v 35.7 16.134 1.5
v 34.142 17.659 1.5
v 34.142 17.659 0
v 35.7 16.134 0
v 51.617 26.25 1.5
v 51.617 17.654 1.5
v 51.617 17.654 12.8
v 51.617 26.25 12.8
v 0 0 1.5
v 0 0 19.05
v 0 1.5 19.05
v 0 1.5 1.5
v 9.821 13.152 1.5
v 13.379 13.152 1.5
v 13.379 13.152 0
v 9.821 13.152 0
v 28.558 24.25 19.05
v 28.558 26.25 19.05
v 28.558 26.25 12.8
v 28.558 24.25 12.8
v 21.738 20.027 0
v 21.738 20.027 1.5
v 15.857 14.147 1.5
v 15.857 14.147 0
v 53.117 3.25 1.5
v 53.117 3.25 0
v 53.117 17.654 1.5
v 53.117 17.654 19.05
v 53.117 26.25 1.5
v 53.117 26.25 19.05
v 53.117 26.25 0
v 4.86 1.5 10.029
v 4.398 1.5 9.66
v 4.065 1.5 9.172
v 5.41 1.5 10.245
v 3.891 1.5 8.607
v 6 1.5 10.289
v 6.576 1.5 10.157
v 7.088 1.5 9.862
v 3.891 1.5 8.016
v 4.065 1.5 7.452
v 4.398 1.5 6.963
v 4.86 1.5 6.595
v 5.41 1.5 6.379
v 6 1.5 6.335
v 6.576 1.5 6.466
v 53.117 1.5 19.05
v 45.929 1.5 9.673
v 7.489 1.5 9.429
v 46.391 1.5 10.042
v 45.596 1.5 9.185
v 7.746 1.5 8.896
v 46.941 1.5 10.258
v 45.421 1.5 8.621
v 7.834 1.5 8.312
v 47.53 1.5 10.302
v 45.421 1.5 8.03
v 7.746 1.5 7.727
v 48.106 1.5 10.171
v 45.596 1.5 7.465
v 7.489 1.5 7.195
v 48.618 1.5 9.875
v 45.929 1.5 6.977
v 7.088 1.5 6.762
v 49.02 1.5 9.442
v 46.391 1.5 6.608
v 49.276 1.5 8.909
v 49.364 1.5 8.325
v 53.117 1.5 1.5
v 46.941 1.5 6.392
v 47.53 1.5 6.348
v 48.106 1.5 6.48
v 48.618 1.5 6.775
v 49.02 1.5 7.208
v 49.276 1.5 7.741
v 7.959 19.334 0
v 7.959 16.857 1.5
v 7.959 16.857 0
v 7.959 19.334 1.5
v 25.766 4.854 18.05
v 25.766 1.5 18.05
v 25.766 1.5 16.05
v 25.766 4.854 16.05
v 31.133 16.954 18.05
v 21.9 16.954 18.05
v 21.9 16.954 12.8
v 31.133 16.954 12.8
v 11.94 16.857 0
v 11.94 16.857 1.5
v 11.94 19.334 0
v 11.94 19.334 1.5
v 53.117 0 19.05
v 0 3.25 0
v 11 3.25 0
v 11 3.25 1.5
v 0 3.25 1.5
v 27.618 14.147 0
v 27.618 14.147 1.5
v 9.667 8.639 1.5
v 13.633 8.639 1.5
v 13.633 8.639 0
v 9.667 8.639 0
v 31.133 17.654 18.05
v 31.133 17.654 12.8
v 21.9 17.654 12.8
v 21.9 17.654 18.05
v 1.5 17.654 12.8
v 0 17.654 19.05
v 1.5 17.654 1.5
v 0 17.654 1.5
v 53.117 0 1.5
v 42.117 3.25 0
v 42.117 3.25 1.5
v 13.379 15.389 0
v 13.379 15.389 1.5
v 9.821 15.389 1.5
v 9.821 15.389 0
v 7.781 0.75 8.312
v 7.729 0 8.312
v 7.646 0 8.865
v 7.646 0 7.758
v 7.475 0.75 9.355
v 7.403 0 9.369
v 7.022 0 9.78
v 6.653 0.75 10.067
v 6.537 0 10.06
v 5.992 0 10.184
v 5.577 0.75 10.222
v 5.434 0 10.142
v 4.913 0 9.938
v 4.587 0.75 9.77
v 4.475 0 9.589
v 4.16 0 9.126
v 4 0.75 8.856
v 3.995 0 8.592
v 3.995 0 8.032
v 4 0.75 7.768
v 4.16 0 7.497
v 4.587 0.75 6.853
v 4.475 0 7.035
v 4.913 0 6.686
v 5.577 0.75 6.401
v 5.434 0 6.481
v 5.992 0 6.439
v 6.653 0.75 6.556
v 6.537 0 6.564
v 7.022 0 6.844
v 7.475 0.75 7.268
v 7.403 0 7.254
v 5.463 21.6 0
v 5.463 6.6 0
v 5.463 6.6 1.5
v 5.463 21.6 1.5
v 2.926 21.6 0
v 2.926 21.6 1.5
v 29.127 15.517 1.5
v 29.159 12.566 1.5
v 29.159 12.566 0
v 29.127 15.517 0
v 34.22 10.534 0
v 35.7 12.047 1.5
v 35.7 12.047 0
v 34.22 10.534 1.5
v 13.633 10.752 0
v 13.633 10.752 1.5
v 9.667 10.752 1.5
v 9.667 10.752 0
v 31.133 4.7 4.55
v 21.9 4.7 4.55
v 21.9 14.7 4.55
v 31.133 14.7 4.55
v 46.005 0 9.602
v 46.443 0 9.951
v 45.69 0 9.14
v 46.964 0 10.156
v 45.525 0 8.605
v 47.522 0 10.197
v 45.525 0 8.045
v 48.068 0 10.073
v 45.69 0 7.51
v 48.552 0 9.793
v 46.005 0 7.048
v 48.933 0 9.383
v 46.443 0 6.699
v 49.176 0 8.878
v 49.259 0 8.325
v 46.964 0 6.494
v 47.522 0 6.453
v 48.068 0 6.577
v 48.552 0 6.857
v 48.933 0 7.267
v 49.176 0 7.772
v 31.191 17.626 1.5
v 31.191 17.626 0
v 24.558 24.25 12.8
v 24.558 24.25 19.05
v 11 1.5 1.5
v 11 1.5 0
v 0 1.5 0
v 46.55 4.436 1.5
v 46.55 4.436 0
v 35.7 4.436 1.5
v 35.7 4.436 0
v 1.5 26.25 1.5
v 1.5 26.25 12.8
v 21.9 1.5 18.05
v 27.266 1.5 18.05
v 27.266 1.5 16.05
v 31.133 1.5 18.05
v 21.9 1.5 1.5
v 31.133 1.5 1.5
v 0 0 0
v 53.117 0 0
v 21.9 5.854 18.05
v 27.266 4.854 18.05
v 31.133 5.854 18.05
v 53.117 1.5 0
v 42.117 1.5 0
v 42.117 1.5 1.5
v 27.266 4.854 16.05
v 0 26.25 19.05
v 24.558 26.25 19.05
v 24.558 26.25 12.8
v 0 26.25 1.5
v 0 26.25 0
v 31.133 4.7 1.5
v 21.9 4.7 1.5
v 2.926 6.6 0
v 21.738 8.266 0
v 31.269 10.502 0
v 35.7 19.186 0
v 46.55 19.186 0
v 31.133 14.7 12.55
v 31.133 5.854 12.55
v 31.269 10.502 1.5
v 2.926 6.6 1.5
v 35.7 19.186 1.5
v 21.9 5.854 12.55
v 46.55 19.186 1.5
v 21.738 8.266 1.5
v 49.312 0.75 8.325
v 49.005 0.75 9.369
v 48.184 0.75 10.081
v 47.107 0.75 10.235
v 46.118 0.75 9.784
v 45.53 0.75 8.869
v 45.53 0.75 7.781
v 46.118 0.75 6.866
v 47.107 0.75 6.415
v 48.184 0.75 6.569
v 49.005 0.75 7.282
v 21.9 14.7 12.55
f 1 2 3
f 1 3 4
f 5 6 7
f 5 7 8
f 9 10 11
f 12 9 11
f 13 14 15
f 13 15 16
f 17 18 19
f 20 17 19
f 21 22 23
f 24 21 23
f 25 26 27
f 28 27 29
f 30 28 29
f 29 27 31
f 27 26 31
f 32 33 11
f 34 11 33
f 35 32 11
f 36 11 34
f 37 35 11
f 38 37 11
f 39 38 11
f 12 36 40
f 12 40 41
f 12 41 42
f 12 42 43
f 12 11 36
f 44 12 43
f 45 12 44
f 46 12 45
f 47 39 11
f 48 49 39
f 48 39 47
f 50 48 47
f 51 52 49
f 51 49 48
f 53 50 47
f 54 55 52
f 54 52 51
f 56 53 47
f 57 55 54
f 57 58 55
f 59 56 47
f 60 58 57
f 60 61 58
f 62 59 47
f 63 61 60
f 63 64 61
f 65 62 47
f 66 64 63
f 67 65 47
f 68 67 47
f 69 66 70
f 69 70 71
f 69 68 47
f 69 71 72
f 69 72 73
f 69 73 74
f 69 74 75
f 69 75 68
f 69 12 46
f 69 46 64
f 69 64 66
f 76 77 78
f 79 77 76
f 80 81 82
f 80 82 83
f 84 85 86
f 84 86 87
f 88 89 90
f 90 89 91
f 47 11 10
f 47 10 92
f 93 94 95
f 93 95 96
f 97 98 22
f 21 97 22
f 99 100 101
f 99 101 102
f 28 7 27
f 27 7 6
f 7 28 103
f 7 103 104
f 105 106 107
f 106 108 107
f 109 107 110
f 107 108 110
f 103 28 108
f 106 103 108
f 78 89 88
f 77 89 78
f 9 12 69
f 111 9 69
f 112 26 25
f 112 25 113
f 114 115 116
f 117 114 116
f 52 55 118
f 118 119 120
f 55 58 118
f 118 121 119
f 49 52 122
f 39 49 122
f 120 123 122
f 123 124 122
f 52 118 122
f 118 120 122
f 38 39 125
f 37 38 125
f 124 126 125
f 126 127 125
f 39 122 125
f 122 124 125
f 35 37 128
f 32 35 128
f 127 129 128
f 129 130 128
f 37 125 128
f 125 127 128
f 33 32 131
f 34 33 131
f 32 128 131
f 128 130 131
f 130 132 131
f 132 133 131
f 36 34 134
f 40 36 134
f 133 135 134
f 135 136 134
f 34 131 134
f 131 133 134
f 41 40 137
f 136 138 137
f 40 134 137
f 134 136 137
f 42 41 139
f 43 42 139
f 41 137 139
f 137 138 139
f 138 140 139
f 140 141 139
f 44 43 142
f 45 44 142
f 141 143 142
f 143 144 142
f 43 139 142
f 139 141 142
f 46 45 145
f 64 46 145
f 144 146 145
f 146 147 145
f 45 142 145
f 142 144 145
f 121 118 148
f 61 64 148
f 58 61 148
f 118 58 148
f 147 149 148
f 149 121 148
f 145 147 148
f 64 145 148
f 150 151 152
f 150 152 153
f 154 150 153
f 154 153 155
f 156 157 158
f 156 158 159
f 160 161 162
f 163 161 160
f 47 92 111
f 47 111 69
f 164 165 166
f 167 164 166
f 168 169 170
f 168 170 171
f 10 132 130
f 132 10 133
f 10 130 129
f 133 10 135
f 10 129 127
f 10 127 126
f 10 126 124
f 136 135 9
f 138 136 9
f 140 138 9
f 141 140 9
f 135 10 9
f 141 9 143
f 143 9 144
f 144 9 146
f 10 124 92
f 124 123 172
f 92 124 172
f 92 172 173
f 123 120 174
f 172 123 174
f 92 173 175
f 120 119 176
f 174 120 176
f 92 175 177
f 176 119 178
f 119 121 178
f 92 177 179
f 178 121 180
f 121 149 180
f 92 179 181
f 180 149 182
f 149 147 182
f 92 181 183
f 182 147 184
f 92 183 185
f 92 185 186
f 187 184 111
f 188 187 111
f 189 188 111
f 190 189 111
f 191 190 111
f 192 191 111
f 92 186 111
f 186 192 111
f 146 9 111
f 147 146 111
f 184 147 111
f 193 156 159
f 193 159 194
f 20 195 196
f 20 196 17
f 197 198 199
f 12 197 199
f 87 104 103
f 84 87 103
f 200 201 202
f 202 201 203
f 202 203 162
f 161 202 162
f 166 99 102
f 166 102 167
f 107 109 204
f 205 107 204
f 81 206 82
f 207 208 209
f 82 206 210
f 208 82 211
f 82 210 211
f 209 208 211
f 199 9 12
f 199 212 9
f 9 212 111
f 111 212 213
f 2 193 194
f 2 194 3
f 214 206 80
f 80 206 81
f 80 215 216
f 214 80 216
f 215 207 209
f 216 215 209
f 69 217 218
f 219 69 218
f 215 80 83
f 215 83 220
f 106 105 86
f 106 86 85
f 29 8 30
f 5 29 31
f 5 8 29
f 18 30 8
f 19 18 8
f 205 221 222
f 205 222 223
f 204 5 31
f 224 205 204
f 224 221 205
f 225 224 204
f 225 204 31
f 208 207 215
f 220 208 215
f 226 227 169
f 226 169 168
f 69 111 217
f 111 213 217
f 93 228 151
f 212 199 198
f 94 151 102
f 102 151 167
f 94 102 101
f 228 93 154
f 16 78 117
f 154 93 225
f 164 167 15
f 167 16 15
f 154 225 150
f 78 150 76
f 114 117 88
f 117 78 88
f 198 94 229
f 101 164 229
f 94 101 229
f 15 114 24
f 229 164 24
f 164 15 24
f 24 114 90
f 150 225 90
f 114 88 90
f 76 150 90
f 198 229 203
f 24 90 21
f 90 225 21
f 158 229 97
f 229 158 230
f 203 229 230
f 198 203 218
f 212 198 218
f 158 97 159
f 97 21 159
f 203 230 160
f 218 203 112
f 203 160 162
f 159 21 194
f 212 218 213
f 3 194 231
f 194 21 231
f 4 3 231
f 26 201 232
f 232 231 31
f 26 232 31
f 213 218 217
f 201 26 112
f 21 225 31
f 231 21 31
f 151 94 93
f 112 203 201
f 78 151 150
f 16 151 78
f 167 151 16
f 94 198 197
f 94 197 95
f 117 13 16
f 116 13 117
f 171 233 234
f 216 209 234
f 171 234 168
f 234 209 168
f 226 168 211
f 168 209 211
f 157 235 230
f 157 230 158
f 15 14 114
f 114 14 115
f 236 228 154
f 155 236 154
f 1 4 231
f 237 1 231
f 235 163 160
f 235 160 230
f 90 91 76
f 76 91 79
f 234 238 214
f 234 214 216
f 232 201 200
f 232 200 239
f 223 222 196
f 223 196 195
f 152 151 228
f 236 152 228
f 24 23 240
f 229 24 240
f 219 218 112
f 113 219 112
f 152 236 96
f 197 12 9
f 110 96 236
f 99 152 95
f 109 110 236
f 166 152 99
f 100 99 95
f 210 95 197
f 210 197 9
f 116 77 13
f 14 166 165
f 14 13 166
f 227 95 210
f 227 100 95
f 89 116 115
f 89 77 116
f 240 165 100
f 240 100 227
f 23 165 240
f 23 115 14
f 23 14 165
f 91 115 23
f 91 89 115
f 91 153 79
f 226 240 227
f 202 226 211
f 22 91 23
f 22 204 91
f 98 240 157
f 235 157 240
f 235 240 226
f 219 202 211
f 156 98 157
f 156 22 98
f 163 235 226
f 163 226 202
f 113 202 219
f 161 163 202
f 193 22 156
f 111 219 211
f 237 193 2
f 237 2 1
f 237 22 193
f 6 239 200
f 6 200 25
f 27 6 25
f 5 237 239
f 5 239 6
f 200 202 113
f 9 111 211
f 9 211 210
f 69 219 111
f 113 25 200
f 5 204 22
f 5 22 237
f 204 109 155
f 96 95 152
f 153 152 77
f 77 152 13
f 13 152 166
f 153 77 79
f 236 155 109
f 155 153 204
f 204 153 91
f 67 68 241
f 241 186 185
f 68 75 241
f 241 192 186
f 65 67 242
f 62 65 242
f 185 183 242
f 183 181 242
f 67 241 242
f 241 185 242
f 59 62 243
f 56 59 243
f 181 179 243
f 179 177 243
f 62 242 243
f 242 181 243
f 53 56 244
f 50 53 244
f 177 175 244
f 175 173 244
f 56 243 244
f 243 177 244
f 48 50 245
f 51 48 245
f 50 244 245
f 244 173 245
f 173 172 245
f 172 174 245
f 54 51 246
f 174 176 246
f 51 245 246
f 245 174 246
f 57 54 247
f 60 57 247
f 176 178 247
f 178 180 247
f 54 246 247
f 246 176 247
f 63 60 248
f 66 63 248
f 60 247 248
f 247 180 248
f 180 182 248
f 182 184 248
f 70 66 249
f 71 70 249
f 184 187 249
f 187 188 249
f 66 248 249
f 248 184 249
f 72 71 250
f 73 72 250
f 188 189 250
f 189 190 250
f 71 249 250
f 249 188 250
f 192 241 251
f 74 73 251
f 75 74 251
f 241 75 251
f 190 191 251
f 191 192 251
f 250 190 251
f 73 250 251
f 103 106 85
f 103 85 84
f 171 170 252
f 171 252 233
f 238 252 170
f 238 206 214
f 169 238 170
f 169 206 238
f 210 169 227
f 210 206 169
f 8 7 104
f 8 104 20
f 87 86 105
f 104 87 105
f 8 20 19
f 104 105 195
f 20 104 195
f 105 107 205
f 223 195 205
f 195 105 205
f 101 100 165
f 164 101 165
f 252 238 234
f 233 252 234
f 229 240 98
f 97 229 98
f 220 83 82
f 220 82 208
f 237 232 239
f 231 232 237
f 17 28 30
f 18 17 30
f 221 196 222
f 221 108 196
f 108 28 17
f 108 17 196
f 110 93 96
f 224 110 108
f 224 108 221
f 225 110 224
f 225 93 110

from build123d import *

# Parameters (mm, degrees)
SKETCH1_W                              = 53.116817528
SKETCH1_H                              = 26.25
FRONT_SIDE_MAIN_DEPTH                  = 1.5
RESET_HOLE_DEPTH                       = 3.25
SKETCH15_W                             = 3.966010581
SKETCH15_H                             = 2.112155191
SKETCH15_W_2                           = 3.557190409
SKETCH15_H_2                           = 2.236587576
SKETCH15_W_3                           = 3.981127105
SKETCH15_H_3                           = 2.476855865
COMPONENT_HOLES_DEPTH                  = 3.25
SKETCH16_W                             = 10.85
SKETCH16_H                             = 14.75
MICROPHONE_HOLE_DEPTH                  = 1.5
SKETCH24_W                             = 1.5
SKETCH24_H                             = 8.595542059
RIGHT_SIDE_TOP_DEPTH                   = 17.55
SKETCH20_W                             = 53.116817528
SKETCH20_H                             = 1.5
BOTTOM_BASE_DEPTH                      = 17.55
SKETCH26_W                             = 1.5
SKETCH26_H                             = 8.595542059
LEFT_SIDE_TOP_DEPTH                    = 17.55
SKETCH27_W                             = 6.25
SKETCH27_H                             = 8.595542059
BACK_BAR_TOP_DEPTH                     = 50.116817528
SERVO_SEPERATOR_BOTTOM_OUTLINE_W       = 9.232806166
SERVO_SEPERATOR_BOTTOM_OUTLINE_H       = 3.2
SERVO_SEPERATOR_BOTTOM_DEPTH           = 16.55
SKETCH28_W                             = 9.232806166
SKETCH28_H                             = 5.25
BACK_BATTERY_HOLDER_TOP_DEPTH          = 0.7
SKETCH34_W                             = 2.537171882
SKETCH34_H                             = 15
PROGRAMMING_HOLE_DEPTH                 = 3.25
SKETCH38_W                             = 9.232806166
SKETCH38_H                             = 5.5
BACK_BATTERY_HOLDER_BOTTOM_DEPTH       = 1.154457941
SKETCH40_R                             = 1.877628079
SERVO_ARM_HOLES_BOTTOM_DEPTH           = 1.5
SERVO_ARM_HOLES_BOTTOM_DRAFT           = 4
SERVO_ARM_HOLES_BOTTOM_PROFILE_2_DEPTH = 1.5
SERVO_ARM_HOLES_BOTTOM_PROFILE_2_DRAFT = 4
SKETCH44_W                             = 1.5
SKETCH44_H                             = 3.354457941
SNAP_HOLE_BOTTOM_DEPTH                 = 2
SKETCH46_W                             = 4
SKETCH46_H                             = 6.25
SNAP_CUT_TOP_DEPTH                     = 2
SKETCH47_W                             = 11
SKETCH47_H                             = 1.75
SOLAR_ARM_HOLES_FRONT_DEPTH            = 1.5
SKETCH49_W                             = 9.232806166
SKETCH49_H                             = 8
RAISED_SERVO_SEPERATOR_DEPTH           = 10


# Read off the part's stored shape, not the designer's step: Servo Seperator - Bottom
with BuildPart() as part:
    # Sketch1 → Front Side - Main (new body)
    with BuildSketch(Plane.XY):
        with Locations((26.558408764, 13.125)):
            Rectangle(SKETCH1_W, SKETCH1_H)
    extrude(amount=FRONT_SIDE_MAIN_DEPTH)

    # Reset Hole Sketch → Reset Hole (cut)
    with BuildSketch(Plane(origin=(0, 0, 3.25), x_dir=(-1, 0, 0), z_dir=(0, 0, -1))):
        Polygon((-31.190735744, 17.626168756), (-34.141748042, 17.658585925), (-36.251351249, 15.594827519), (-36.283768419, 12.643815222), (-34.220010013, 10.534212015), (-31.268997715, 10.501794845), (-29.159394508, 12.565553251), (-29.126977338, 15.516565548), align=None)
    extrude(amount=RESET_HOLE_DEPTH, mode=Mode.SUBTRACT)

    # Sketch15 → Component Holes (cut)
    with BuildSketch(Plane(origin=(0, 0, 3.25), x_dir=(-1, 0, 0), z_dir=(0, 0, -1))):
        Polygon((-21.737702993, 20.027277789), (-15.857179586, 14.146754382), (-21.737702993, 8.266230975), (-27.6182264, 14.146754382), align=None)
        with Locations((-11.649935563, 9.695513201)):
            Rectangle(SKETCH15_W, SKETCH15_H)
        with Locations((-11.599935563, 14.270513201)):
            Rectangle(SKETCH15_W_2, SKETCH15_H_2)
        with Locations((-9.949935563, 18.095513201)):
            Rectangle(SKETCH15_W_3, SKETCH15_H_3)
    extrude(amount=COMPONENT_HOLES_DEPTH, mode=Mode.SUBTRACT)

    # Sketch16 → Microphone Hole (cut)
    with BuildSketch(Plane(origin=(0, 0, 0), x_dir=(-1, 0, 0), z_dir=(0, 0, -1))):
        with Locations((-41.124935562, 11.81098353)):
            Rectangle(SKETCH16_W, SKETCH16_H)
    extrude(amount=-MICROPHONE_HOLE_DEPTH, mode=Mode.SUBTRACT)

    # Sketch24 → Right Side - Top (add)
    with BuildSketch(Plane.XY.offset(1.5)):
        with Locations((0.75, 21.952228971)):
            Rectangle(SKETCH24_W, SKETCH24_H)
    extrude(amount=RIGHT_SIDE_TOP_DEPTH)

    # Sketch26 → Left Side - Top (add)
    with BuildSketch(Plane.XY.offset(1.5)):
        with Locations((52.366817528, 21.952228971)):
            Rectangle(SKETCH26_W, SKETCH26_H)
    extrude(amount=LEFT_SIDE_TOP_DEPTH)

    # Sketch27 → Back Bar - Top (add)
    with BuildSketch(Plane(origin=(1.5, 0, 0), x_dir=(0, 0, -1), z_dir=(1, 0, 0))):
        with Locations((-15.925, 21.952228971)):
            Rectangle(SKETCH27_W, SKETCH27_H)
    extrude(amount=BACK_BAR_TOP_DEPTH)

    # Servo Seperator - Bottom outline → Servo Seperator - Bottom (add)
    with BuildSketch(Plane.XY.offset(1.5)):
        with Locations((26.516403083, 3.1)):
            Rectangle(SERVO_SEPERATOR_BOTTOM_OUTLINE_W, SERVO_SEPERATOR_BOTTOM_OUTLINE_H)
    extrude(amount=SERVO_SEPERATOR_BOTTOM_DEPTH)

    # Sketch28 → Back Battery Holder - Top (add)
    with BuildSketch(Plane.XZ.offset(-17.654457941)):
        with Locations((26.516403083, 15.425)):
            Rectangle(SKETCH28_W, SKETCH28_H)
    extrude(amount=BACK_BATTERY_HOLDER_TOP_DEPTH)

    # Sketch34 → Programming Hole (cut)
    with BuildSketch(Plane(origin=(0, 0, 0), x_dir=(-1, 0, 0), z_dir=(0, 0, -1))):
        with Locations((-4.194161079, 14.100049249)):
            Rectangle(SKETCH34_W, SKETCH34_H)
    extrude(amount=-PROGRAMMING_HOLE_DEPTH, mode=Mode.SUBTRACT)

    # Sketch38 → Back Battery Holder - Bottom (add)
    with BuildSketch(Plane(origin=(0, 4.7, 0), x_dir=(1, 0, 0), z_dir=(0, 1, 0))):
        with Locations((26.516403083, -15.3)):
            Rectangle(SKETCH38_W, SKETCH38_H)
    extrude(amount=BACK_BATTERY_HOLDER_BOTTOM_DEPTH)

    # Sketch44 → Snap Hole - Bottom (cut)
    with BuildSketch(Plane.XY.offset(18.05)):
        with Locations((26.516403083, 3.177228971)):
            Rectangle(SKETCH44_W, SKETCH44_H)
    extrude(amount=-SNAP_HOLE_BOTTOM_DEPTH, mode=Mode.SUBTRACT)

    # Sketch46 → Snap Cut - Top (cut)
    with BuildSketch(Plane(origin=(0, 26.25, 0), x_dir=(1, 0, 0), z_dir=(0, 1, 0))):
        with Locations((26.558408764, -15.925)):
            Rectangle(SKETCH46_W, SKETCH46_H)
    extrude(amount=-SNAP_CUT_TOP_DEPTH, mode=Mode.SUBTRACT)

    # Sketch47 → Solar Arm Holes - Front (cut)
    with BuildSketch(Plane(origin=(0, 0, 0), x_dir=(-1, 0, 0), z_dir=(0, 0, -1))):
        with Locations((-5.5, 2.375)):
            Rectangle(SKETCH47_W, SKETCH47_H)
        with Locations((-47.616817528, 2.375)):
            Rectangle(SKETCH47_W, SKETCH47_H)
    extrude(amount=-SOLAR_ARM_HOLES_FRONT_DEPTH, mode=Mode.SUBTRACT)

    # Sketch49 → Raised Servo Seperator (add)
    with BuildSketch(Plane(origin=(0, 4.7, 0), x_dir=(1, 0, 0), z_dir=(0, 1, 0))):
        with Locations((26.516403083, -8.55)):
            Rectangle(SKETCH49_W, SKETCH49_H)
    extrude(amount=RAISED_SERVO_SEPERATOR_DEPTH)


with BuildPart() as body_2:
    # Sketch20 → Bottom Base (new body)
    with BuildSketch(Plane.XY.offset(1.5)):
        with Locations((26.558408764, 0.75)):
            Rectangle(SKETCH20_W, SKETCH20_H)
    extrude(amount=BOTTOM_BASE_DEPTH)


with BuildPart() as servo_arm_holes_bottom_tool:
    # Sketch40 → Servo arm Holes - Bottom (with draft: the straight prism first)
    with BuildSketch(Plane.XZ):
        with Locations((5.851424663, 8.311788641)):
            Circle(SKETCH40_R)
    extrude(amount=-SERVO_ARM_HOLES_BOTTOM_DEPTH)
    # Servo arm Holes - Bottom: the draft: its side faces are tilted about the plane it starts from
    servo_arm_holes_bottom_sides = [servo_arm_holes_bottom_tool.faces().sort_by_distance(p)[0] for p in [
        (3.973796583, 0.75, 8.311788641),
    ]]
    draft(servo_arm_holes_bottom_sides, Plane.XZ, SERVO_ARM_HOLES_BOTTOM_DRAFT)


with BuildPart() as body_2_1:
    add(body_2.part)

    # Servo arm Holes - Bottom: cut by servo_arm_holes_bottom_tool
    add(servo_arm_holes_bottom_tool.part, mode=Mode.SUBTRACT)


with BuildPart() as servo_arm_holes_bottom_profile_2_tool:
    # Sketch40 → Servo arm Holes - Bottom profile 2 (with draft: the straight prism first)
    with BuildSketch(Plane.XZ):
        with Locations((47.381795968, 8.325039035)):
            Circle(SKETCH40_R)
    extrude(amount=-SERVO_ARM_HOLES_BOTTOM_PROFILE_2_DEPTH)
    # Servo arm Holes - Bottom profile 2: the draft: its side faces are tilted about the plane it starts from
    servo_arm_holes_bottom_profile_2_sides = [servo_arm_holes_bottom_profile_2_tool.faces().sort_by_distance(p)[0] for p in [
        (45.504167889, 0.75, 8.325039035),
    ]]
    draft(servo_arm_holes_bottom_profile_2_sides, Plane.XZ, SERVO_ARM_HOLES_BOTTOM_PROFILE_2_DRAFT)


with BuildPart() as body_2_2:
    add(body_2_1.part)

    # Servo arm Holes - Bottom profile 2: cut by servo_arm_holes_bottom_profile_2_tool
    add(servo_arm_holes_bottom_profile_2_tool.part, mode=Mode.SUBTRACT)


solid = Compound([part.part, body_2_2.part])
